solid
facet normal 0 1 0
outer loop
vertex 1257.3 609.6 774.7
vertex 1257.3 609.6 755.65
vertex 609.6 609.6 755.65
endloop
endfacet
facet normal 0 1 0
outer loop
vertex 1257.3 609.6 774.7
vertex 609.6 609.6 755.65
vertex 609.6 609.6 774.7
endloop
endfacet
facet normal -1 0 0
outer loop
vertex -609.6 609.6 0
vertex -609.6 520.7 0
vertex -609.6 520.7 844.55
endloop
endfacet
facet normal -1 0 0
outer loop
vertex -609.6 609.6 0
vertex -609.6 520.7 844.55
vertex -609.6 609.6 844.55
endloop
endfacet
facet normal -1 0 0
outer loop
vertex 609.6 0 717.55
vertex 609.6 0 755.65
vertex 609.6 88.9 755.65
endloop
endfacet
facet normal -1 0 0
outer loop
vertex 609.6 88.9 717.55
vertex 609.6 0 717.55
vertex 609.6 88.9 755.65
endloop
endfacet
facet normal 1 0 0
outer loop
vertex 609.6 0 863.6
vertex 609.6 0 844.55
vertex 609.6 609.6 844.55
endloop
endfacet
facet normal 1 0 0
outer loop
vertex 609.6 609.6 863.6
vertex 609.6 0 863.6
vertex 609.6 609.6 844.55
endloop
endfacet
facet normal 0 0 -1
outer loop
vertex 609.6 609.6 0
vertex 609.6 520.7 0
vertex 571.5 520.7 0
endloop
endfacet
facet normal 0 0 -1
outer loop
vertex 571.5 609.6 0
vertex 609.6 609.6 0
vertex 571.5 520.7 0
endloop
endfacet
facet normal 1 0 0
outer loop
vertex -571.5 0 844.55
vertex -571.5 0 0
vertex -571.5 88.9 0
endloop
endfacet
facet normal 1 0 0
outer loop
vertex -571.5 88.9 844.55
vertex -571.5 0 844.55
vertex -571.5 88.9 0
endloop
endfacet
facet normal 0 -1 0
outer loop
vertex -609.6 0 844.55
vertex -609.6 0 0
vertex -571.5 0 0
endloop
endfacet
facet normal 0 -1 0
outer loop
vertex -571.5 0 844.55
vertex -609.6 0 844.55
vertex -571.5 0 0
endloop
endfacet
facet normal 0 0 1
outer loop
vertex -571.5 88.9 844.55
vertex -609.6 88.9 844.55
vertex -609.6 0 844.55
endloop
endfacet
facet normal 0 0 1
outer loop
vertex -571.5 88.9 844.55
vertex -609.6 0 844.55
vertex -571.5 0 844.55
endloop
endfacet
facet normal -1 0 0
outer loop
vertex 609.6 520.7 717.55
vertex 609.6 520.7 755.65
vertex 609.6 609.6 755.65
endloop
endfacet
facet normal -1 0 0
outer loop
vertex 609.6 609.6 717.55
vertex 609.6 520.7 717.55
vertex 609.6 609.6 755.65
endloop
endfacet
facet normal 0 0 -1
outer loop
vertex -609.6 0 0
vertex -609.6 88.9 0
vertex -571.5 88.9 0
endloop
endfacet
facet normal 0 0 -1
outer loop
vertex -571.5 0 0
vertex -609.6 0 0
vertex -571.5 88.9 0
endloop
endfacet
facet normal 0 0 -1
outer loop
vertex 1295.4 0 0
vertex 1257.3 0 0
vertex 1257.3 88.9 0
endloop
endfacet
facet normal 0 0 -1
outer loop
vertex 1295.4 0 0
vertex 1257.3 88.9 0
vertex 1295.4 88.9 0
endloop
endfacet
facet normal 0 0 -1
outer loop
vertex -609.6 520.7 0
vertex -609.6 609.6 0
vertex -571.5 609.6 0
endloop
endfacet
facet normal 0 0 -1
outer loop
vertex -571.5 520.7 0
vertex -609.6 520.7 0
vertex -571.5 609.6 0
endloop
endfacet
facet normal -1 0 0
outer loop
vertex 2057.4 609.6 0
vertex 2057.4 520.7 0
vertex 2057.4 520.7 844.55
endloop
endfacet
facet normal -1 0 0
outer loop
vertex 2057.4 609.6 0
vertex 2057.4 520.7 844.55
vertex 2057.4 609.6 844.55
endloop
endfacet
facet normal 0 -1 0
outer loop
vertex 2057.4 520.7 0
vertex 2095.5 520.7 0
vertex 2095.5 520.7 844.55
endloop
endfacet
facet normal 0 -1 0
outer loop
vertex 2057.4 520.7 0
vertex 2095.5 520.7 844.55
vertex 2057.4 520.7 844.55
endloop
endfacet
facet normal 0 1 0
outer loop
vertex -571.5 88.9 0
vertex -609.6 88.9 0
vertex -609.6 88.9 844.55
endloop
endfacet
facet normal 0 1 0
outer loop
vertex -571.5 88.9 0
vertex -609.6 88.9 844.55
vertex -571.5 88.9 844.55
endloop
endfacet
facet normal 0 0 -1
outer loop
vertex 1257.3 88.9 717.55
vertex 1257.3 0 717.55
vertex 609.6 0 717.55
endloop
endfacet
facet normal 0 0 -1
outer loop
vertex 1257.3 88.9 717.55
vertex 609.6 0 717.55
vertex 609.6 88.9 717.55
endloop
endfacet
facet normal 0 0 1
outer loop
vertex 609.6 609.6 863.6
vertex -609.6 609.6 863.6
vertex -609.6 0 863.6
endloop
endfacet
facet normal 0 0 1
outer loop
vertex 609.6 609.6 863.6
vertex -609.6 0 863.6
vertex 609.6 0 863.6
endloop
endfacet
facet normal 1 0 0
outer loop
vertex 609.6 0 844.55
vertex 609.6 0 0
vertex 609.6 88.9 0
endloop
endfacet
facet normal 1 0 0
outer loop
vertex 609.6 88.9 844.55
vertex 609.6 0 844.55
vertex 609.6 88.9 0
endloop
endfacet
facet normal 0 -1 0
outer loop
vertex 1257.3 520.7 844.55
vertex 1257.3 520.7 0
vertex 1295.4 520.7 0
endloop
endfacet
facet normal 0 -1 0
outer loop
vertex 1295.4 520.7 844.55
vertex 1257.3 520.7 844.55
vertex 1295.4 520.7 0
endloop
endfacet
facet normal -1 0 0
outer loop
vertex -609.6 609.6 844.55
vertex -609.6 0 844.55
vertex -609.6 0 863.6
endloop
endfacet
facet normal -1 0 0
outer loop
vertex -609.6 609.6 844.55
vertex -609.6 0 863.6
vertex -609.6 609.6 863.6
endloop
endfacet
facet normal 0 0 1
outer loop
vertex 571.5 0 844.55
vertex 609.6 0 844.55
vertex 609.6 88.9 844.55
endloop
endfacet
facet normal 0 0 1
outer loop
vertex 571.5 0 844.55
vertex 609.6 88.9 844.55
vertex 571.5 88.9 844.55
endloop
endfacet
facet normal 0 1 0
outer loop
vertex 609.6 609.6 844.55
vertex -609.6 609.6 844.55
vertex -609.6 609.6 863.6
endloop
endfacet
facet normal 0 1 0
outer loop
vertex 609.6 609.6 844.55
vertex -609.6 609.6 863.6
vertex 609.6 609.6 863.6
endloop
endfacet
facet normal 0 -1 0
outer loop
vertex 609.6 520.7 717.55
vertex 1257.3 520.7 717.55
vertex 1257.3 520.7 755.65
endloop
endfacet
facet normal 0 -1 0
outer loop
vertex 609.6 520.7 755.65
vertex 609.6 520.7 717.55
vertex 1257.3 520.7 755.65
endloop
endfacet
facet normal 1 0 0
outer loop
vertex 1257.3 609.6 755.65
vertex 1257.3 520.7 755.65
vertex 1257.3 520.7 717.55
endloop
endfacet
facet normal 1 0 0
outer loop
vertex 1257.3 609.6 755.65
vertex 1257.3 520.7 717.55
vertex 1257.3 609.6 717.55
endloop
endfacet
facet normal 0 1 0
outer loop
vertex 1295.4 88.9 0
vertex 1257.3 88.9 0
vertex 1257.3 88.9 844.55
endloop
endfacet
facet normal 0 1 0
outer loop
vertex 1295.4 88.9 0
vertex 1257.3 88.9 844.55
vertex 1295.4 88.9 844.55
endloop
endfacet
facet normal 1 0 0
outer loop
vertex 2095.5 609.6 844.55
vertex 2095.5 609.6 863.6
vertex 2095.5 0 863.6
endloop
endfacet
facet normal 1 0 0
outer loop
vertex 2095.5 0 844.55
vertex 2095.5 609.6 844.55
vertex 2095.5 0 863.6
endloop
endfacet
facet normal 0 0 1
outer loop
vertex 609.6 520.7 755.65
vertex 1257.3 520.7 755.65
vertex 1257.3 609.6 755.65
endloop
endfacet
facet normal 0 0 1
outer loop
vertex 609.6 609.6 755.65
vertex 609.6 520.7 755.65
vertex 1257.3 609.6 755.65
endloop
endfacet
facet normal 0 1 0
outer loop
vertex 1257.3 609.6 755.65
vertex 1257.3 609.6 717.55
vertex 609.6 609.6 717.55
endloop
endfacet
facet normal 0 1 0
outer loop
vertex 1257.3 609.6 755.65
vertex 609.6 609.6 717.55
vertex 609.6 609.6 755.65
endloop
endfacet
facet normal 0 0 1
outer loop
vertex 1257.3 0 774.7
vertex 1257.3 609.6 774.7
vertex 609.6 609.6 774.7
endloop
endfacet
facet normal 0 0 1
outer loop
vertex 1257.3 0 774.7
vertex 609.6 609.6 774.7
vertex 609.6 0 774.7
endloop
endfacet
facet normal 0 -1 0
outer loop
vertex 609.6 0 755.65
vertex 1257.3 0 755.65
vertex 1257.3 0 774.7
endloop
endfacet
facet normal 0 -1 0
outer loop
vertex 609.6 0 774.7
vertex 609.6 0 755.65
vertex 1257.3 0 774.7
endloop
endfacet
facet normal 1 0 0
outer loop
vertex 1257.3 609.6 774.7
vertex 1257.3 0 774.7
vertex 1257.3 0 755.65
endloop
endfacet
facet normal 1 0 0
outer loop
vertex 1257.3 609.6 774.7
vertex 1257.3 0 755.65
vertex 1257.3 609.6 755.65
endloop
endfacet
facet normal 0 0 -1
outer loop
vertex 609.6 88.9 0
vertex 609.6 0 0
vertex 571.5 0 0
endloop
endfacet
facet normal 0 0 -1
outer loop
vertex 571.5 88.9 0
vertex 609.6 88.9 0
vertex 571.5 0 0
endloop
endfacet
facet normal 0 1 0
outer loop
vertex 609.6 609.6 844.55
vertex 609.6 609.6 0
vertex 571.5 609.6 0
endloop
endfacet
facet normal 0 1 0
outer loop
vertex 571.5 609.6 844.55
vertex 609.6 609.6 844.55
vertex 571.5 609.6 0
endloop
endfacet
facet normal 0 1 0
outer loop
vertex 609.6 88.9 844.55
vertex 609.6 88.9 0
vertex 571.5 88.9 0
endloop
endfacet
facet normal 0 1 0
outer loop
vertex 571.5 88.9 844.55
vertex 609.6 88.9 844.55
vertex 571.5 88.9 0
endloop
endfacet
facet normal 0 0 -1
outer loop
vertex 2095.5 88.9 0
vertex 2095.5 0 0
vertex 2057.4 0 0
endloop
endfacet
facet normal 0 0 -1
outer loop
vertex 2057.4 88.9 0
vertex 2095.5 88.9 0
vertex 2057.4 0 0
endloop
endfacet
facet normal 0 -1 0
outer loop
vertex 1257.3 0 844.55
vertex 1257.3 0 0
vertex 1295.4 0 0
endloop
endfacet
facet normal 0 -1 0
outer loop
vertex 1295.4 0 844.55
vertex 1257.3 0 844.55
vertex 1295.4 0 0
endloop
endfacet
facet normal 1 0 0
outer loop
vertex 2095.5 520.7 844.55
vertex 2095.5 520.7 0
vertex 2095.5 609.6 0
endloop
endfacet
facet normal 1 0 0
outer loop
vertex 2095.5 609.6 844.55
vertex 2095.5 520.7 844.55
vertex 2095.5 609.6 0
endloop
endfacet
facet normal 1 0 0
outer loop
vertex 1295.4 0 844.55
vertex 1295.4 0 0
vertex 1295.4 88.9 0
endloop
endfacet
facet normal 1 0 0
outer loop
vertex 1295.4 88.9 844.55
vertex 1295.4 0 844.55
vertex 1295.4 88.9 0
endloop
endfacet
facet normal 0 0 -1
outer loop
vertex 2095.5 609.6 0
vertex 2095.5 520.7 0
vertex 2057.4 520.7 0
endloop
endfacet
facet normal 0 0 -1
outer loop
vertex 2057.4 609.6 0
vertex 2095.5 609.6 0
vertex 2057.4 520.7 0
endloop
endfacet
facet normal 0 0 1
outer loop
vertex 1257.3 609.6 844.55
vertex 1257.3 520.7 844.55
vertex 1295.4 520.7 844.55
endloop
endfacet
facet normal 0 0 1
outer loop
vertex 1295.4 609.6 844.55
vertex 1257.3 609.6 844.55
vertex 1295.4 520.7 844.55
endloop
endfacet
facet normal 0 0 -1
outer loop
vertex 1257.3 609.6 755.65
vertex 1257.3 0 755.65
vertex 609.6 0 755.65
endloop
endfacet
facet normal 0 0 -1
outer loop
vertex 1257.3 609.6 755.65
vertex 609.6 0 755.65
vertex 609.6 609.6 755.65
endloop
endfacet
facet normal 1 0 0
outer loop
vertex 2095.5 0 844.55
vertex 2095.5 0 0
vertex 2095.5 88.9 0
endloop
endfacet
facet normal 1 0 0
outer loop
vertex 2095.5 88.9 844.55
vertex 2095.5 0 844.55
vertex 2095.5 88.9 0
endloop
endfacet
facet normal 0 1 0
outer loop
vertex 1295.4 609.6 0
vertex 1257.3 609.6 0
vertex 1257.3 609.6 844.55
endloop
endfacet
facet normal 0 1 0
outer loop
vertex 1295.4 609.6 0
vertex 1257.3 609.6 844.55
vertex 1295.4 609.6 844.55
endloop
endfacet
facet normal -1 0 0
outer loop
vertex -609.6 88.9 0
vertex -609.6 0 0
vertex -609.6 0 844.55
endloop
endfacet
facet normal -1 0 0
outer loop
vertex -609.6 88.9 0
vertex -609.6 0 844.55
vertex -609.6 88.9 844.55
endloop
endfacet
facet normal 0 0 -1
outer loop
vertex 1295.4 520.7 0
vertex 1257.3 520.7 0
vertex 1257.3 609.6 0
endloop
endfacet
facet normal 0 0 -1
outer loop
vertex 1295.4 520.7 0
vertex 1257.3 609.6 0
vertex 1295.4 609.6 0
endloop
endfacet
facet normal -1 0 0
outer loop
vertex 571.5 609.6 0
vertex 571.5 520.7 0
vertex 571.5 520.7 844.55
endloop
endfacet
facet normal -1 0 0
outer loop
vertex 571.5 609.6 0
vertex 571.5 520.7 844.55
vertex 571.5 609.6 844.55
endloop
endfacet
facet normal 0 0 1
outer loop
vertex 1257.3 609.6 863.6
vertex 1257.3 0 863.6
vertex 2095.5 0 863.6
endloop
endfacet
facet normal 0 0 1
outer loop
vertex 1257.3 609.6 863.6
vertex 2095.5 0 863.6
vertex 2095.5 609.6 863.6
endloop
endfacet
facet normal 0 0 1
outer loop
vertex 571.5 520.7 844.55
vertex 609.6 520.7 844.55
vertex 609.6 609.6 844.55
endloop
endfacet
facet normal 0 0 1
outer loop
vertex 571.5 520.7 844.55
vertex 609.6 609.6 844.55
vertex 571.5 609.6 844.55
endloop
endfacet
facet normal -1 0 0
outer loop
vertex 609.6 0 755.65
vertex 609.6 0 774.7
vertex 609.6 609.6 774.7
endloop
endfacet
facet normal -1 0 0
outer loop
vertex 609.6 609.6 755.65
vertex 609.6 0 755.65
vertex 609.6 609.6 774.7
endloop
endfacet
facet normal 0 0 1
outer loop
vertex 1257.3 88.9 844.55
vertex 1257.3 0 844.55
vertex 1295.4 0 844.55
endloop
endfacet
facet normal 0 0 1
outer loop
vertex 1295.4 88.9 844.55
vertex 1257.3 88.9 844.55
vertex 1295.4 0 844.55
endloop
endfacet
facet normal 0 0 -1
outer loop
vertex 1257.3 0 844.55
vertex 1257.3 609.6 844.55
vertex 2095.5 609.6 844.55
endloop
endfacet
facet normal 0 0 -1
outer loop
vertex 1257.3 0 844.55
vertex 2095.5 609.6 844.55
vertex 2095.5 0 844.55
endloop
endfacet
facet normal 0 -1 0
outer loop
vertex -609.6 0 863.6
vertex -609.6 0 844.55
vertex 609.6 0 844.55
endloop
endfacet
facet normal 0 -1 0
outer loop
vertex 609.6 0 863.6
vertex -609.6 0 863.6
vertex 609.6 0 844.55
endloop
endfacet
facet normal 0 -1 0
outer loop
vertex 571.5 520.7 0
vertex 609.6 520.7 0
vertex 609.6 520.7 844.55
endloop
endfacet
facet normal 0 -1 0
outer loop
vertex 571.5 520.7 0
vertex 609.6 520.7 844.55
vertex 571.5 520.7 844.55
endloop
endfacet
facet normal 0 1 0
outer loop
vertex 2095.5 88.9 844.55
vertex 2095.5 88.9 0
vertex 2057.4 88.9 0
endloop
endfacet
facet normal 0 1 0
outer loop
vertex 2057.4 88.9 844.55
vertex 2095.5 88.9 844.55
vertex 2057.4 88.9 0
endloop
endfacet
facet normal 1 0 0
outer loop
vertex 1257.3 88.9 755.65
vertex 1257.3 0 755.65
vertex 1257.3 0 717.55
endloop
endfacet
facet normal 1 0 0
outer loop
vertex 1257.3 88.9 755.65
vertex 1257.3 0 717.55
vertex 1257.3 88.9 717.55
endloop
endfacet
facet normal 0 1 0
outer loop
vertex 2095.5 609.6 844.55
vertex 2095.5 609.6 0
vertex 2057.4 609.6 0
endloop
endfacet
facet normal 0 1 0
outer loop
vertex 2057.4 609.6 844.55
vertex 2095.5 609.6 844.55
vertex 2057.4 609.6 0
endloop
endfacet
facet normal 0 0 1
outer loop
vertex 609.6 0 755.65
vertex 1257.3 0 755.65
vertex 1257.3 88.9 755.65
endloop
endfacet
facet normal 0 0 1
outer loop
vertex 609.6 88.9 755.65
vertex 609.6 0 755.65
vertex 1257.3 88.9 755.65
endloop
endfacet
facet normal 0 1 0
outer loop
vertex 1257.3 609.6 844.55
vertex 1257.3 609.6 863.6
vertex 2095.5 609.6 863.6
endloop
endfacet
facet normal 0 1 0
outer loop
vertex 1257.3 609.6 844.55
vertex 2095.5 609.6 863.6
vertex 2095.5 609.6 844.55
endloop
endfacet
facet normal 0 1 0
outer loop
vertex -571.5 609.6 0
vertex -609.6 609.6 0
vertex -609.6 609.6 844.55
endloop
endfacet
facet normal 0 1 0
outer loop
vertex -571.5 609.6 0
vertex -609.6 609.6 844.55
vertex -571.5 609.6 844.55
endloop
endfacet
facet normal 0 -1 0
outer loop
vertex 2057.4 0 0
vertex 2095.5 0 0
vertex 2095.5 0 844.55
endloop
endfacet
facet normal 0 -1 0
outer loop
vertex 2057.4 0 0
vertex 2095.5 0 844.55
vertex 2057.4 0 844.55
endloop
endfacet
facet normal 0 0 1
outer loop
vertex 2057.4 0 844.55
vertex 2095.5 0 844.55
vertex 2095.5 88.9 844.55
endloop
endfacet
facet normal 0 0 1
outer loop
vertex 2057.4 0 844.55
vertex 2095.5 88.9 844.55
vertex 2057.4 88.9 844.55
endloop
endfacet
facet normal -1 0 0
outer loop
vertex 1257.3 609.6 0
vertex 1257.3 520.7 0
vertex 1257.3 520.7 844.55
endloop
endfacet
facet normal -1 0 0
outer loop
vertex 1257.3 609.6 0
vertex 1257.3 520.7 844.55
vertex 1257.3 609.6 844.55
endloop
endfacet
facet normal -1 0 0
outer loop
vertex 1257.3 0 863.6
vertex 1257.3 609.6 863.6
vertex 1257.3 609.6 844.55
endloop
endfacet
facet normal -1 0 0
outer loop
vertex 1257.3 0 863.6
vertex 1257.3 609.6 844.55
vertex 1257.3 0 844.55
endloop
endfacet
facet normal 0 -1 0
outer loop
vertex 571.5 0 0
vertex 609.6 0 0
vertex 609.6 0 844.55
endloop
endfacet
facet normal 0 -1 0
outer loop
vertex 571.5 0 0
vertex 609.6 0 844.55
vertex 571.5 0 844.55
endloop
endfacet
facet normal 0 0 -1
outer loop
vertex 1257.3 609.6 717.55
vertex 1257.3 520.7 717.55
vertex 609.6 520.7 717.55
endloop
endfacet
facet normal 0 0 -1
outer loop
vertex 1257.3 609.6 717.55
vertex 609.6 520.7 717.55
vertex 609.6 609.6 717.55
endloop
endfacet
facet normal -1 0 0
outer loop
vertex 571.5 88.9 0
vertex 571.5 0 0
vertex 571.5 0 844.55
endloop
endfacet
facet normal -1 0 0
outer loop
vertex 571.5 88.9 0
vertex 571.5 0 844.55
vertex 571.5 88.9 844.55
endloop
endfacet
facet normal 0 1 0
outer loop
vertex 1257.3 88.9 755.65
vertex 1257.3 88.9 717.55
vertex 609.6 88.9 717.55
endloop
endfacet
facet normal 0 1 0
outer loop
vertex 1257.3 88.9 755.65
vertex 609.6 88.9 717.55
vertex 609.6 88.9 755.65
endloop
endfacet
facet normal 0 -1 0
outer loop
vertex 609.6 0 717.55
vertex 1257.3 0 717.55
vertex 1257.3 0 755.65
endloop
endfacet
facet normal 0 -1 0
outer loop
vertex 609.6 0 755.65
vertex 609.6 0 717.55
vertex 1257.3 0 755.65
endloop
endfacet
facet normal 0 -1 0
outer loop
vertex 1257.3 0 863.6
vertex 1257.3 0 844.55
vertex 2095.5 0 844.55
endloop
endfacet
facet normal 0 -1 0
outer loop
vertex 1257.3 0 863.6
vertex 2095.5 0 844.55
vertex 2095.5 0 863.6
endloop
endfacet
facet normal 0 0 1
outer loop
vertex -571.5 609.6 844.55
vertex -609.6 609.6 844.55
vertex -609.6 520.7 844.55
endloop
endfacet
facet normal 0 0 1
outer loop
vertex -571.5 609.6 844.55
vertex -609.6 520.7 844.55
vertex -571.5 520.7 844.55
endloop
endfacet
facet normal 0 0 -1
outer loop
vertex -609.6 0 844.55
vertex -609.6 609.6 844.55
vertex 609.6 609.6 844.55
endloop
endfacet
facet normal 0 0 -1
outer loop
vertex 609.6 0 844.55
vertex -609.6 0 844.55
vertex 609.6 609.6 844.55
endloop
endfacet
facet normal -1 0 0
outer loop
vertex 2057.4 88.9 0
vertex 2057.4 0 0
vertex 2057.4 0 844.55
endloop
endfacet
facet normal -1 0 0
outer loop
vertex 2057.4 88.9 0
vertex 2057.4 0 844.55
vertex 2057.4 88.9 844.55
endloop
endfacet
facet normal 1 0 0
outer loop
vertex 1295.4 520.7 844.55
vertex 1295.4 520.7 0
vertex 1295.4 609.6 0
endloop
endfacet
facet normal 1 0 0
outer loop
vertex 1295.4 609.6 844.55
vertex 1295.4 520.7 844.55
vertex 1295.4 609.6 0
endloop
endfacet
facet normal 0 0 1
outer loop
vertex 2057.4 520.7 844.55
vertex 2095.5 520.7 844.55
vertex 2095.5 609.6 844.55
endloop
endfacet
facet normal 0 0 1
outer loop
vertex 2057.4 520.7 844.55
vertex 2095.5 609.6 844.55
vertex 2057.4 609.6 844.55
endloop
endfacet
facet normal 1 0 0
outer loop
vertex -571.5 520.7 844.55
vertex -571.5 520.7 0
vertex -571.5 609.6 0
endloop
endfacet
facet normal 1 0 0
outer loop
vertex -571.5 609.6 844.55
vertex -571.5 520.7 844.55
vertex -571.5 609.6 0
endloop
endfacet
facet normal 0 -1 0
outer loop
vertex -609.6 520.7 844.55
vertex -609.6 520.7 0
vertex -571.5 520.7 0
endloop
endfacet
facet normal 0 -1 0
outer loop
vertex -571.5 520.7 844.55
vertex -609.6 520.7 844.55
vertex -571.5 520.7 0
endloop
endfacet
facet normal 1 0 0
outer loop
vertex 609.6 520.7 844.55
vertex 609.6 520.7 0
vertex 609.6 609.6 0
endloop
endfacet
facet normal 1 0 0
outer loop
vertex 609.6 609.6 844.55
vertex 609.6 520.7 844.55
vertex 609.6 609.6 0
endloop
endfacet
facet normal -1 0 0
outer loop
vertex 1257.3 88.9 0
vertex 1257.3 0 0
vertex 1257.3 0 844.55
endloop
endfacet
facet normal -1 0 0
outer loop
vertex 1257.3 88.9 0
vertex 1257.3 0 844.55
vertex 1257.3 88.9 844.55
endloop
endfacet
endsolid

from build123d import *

# Parameters (mm, degrees)
F0_W      = 38.1
F0_H      = 88.9
F1_DEPTH  = 844.55
F4_W      = 1219.2
F4_H      = 609.6
F5_DEPTH  = 19.05
F6_W      = 88.9
F6_H      = 38.1
F7_DEPTH  = 647.7
F6_H_2    = 19.05
F6_W_2    = 431.8
F8_DEPTH  = 647.7
F15_DEPTH = 838.1999999997


with BuildPart() as f1:
    # F0 (on Top) → F1 (new body)
    with BuildSketch(Plane.XY):
        with Locations((-590.55, 565.15)):
            Rectangle(F0_W, F0_H)
    extrude(amount=F1_DEPTH)


with BuildPart() as f1b:
    # F0 (on Top) → F1, piece 2 (new body)
    with BuildSketch(Plane.XY):
        with Locations((-590.55, 44.45)):
            Rectangle(F0_W, F0_H)
    extrude(amount=F1_DEPTH)


with BuildPart() as f2_1:
    # F2: instance of F1b
    add(f1b.part.mirror(Plane.YZ))


with BuildPart() as f2_2:
    # F2: instance of F1
    add(f1.part.mirror(Plane.YZ))


with BuildPart() as f5:
    # F4 (on plane+point) → F5 (new body)
    with BuildSketch(Plane.XY.offset(844.55)):
        with Locations((0, 304.8)):
            Rectangle(F4_W, F4_H)
    extrude(amount=F5_DEPTH)


with BuildPart() as f7:
    # F6 (on face) → F7 (new body)
    with BuildSketch(Plane.YZ.offset(609.6)):
        with Locations((44.45, 736.6)):
            Rectangle(F6_W, F6_H)
    extrude(amount=F7_DEPTH)


with BuildPart() as f7b:
    # F6 (on face) → F7, piece 2 (new body)
    with BuildSketch(Plane.YZ.offset(609.6)):
        with Locations((565.15, 736.6)):
            Rectangle(F6_W, F6_H)
    extrude(amount=F7_DEPTH)


with BuildPart() as f8:
    # F6 (on face) → F8 (new body, through all)
    with BuildSketch(Plane.YZ.offset(609.6)):
        with Locations((44.45, 765.175)):
            Rectangle(F6_W, F6_H_2)
        with Locations((565.15, 765.175)):
            Rectangle(F6_W, F6_H_2)
        with Locations((304.8, 765.175)):
            Rectangle(F6_W_2, F6_H_2)
    extrude(amount=F8_DEPTH)


with BuildPart() as f11_1:
    # F11: instance of F2_1
    add(f2_1.part.mirror(Plane.YZ.offset(933.45)))


with BuildPart() as f11_2:
    # F11: instance of F2_2
    add(f2_2.part.mirror(Plane.YZ.offset(933.45)))


with BuildPart() as f13_1:
    # F13: instance of F11_1
    add(f11_1.part.mirror(Plane(origin=(1676.4, 44.45, 422.275), x_dir=(0, 1, 0), z_dir=(1, 0, 0))))


with BuildPart() as f13_2:
    # F13: instance of F11_2
    add(f11_2.part.mirror(Plane(origin=(1676.4, 44.45, 422.275), x_dir=(0, 1, 0), z_dir=(1, 0, 0))))


with BuildPart() as f15:
    # F14 (on face) → F15 (new body, through all)
    with BuildSketch(Plane(origin=(1257.3000000003, 0, 0), x_dir=(0, -1, 0), z_dir=(-1, 0, 0))):
        Polygon((-609.6, 863.6), (-609.6, 844.55), (-520.7, 844.55), (-88.9, 844.55), (0, 844.55), (0, 863.6), align=None)
    extrude(amount=-F15_DEPTH)


solid = Compound([f1.part, f1b.part, f2_1.part, f2_2.part, f5.part, f7.part, f7b.part, f8.part, f11_1.part, f11_2.part, f13_1.part, f13_2.part, f15.part])
